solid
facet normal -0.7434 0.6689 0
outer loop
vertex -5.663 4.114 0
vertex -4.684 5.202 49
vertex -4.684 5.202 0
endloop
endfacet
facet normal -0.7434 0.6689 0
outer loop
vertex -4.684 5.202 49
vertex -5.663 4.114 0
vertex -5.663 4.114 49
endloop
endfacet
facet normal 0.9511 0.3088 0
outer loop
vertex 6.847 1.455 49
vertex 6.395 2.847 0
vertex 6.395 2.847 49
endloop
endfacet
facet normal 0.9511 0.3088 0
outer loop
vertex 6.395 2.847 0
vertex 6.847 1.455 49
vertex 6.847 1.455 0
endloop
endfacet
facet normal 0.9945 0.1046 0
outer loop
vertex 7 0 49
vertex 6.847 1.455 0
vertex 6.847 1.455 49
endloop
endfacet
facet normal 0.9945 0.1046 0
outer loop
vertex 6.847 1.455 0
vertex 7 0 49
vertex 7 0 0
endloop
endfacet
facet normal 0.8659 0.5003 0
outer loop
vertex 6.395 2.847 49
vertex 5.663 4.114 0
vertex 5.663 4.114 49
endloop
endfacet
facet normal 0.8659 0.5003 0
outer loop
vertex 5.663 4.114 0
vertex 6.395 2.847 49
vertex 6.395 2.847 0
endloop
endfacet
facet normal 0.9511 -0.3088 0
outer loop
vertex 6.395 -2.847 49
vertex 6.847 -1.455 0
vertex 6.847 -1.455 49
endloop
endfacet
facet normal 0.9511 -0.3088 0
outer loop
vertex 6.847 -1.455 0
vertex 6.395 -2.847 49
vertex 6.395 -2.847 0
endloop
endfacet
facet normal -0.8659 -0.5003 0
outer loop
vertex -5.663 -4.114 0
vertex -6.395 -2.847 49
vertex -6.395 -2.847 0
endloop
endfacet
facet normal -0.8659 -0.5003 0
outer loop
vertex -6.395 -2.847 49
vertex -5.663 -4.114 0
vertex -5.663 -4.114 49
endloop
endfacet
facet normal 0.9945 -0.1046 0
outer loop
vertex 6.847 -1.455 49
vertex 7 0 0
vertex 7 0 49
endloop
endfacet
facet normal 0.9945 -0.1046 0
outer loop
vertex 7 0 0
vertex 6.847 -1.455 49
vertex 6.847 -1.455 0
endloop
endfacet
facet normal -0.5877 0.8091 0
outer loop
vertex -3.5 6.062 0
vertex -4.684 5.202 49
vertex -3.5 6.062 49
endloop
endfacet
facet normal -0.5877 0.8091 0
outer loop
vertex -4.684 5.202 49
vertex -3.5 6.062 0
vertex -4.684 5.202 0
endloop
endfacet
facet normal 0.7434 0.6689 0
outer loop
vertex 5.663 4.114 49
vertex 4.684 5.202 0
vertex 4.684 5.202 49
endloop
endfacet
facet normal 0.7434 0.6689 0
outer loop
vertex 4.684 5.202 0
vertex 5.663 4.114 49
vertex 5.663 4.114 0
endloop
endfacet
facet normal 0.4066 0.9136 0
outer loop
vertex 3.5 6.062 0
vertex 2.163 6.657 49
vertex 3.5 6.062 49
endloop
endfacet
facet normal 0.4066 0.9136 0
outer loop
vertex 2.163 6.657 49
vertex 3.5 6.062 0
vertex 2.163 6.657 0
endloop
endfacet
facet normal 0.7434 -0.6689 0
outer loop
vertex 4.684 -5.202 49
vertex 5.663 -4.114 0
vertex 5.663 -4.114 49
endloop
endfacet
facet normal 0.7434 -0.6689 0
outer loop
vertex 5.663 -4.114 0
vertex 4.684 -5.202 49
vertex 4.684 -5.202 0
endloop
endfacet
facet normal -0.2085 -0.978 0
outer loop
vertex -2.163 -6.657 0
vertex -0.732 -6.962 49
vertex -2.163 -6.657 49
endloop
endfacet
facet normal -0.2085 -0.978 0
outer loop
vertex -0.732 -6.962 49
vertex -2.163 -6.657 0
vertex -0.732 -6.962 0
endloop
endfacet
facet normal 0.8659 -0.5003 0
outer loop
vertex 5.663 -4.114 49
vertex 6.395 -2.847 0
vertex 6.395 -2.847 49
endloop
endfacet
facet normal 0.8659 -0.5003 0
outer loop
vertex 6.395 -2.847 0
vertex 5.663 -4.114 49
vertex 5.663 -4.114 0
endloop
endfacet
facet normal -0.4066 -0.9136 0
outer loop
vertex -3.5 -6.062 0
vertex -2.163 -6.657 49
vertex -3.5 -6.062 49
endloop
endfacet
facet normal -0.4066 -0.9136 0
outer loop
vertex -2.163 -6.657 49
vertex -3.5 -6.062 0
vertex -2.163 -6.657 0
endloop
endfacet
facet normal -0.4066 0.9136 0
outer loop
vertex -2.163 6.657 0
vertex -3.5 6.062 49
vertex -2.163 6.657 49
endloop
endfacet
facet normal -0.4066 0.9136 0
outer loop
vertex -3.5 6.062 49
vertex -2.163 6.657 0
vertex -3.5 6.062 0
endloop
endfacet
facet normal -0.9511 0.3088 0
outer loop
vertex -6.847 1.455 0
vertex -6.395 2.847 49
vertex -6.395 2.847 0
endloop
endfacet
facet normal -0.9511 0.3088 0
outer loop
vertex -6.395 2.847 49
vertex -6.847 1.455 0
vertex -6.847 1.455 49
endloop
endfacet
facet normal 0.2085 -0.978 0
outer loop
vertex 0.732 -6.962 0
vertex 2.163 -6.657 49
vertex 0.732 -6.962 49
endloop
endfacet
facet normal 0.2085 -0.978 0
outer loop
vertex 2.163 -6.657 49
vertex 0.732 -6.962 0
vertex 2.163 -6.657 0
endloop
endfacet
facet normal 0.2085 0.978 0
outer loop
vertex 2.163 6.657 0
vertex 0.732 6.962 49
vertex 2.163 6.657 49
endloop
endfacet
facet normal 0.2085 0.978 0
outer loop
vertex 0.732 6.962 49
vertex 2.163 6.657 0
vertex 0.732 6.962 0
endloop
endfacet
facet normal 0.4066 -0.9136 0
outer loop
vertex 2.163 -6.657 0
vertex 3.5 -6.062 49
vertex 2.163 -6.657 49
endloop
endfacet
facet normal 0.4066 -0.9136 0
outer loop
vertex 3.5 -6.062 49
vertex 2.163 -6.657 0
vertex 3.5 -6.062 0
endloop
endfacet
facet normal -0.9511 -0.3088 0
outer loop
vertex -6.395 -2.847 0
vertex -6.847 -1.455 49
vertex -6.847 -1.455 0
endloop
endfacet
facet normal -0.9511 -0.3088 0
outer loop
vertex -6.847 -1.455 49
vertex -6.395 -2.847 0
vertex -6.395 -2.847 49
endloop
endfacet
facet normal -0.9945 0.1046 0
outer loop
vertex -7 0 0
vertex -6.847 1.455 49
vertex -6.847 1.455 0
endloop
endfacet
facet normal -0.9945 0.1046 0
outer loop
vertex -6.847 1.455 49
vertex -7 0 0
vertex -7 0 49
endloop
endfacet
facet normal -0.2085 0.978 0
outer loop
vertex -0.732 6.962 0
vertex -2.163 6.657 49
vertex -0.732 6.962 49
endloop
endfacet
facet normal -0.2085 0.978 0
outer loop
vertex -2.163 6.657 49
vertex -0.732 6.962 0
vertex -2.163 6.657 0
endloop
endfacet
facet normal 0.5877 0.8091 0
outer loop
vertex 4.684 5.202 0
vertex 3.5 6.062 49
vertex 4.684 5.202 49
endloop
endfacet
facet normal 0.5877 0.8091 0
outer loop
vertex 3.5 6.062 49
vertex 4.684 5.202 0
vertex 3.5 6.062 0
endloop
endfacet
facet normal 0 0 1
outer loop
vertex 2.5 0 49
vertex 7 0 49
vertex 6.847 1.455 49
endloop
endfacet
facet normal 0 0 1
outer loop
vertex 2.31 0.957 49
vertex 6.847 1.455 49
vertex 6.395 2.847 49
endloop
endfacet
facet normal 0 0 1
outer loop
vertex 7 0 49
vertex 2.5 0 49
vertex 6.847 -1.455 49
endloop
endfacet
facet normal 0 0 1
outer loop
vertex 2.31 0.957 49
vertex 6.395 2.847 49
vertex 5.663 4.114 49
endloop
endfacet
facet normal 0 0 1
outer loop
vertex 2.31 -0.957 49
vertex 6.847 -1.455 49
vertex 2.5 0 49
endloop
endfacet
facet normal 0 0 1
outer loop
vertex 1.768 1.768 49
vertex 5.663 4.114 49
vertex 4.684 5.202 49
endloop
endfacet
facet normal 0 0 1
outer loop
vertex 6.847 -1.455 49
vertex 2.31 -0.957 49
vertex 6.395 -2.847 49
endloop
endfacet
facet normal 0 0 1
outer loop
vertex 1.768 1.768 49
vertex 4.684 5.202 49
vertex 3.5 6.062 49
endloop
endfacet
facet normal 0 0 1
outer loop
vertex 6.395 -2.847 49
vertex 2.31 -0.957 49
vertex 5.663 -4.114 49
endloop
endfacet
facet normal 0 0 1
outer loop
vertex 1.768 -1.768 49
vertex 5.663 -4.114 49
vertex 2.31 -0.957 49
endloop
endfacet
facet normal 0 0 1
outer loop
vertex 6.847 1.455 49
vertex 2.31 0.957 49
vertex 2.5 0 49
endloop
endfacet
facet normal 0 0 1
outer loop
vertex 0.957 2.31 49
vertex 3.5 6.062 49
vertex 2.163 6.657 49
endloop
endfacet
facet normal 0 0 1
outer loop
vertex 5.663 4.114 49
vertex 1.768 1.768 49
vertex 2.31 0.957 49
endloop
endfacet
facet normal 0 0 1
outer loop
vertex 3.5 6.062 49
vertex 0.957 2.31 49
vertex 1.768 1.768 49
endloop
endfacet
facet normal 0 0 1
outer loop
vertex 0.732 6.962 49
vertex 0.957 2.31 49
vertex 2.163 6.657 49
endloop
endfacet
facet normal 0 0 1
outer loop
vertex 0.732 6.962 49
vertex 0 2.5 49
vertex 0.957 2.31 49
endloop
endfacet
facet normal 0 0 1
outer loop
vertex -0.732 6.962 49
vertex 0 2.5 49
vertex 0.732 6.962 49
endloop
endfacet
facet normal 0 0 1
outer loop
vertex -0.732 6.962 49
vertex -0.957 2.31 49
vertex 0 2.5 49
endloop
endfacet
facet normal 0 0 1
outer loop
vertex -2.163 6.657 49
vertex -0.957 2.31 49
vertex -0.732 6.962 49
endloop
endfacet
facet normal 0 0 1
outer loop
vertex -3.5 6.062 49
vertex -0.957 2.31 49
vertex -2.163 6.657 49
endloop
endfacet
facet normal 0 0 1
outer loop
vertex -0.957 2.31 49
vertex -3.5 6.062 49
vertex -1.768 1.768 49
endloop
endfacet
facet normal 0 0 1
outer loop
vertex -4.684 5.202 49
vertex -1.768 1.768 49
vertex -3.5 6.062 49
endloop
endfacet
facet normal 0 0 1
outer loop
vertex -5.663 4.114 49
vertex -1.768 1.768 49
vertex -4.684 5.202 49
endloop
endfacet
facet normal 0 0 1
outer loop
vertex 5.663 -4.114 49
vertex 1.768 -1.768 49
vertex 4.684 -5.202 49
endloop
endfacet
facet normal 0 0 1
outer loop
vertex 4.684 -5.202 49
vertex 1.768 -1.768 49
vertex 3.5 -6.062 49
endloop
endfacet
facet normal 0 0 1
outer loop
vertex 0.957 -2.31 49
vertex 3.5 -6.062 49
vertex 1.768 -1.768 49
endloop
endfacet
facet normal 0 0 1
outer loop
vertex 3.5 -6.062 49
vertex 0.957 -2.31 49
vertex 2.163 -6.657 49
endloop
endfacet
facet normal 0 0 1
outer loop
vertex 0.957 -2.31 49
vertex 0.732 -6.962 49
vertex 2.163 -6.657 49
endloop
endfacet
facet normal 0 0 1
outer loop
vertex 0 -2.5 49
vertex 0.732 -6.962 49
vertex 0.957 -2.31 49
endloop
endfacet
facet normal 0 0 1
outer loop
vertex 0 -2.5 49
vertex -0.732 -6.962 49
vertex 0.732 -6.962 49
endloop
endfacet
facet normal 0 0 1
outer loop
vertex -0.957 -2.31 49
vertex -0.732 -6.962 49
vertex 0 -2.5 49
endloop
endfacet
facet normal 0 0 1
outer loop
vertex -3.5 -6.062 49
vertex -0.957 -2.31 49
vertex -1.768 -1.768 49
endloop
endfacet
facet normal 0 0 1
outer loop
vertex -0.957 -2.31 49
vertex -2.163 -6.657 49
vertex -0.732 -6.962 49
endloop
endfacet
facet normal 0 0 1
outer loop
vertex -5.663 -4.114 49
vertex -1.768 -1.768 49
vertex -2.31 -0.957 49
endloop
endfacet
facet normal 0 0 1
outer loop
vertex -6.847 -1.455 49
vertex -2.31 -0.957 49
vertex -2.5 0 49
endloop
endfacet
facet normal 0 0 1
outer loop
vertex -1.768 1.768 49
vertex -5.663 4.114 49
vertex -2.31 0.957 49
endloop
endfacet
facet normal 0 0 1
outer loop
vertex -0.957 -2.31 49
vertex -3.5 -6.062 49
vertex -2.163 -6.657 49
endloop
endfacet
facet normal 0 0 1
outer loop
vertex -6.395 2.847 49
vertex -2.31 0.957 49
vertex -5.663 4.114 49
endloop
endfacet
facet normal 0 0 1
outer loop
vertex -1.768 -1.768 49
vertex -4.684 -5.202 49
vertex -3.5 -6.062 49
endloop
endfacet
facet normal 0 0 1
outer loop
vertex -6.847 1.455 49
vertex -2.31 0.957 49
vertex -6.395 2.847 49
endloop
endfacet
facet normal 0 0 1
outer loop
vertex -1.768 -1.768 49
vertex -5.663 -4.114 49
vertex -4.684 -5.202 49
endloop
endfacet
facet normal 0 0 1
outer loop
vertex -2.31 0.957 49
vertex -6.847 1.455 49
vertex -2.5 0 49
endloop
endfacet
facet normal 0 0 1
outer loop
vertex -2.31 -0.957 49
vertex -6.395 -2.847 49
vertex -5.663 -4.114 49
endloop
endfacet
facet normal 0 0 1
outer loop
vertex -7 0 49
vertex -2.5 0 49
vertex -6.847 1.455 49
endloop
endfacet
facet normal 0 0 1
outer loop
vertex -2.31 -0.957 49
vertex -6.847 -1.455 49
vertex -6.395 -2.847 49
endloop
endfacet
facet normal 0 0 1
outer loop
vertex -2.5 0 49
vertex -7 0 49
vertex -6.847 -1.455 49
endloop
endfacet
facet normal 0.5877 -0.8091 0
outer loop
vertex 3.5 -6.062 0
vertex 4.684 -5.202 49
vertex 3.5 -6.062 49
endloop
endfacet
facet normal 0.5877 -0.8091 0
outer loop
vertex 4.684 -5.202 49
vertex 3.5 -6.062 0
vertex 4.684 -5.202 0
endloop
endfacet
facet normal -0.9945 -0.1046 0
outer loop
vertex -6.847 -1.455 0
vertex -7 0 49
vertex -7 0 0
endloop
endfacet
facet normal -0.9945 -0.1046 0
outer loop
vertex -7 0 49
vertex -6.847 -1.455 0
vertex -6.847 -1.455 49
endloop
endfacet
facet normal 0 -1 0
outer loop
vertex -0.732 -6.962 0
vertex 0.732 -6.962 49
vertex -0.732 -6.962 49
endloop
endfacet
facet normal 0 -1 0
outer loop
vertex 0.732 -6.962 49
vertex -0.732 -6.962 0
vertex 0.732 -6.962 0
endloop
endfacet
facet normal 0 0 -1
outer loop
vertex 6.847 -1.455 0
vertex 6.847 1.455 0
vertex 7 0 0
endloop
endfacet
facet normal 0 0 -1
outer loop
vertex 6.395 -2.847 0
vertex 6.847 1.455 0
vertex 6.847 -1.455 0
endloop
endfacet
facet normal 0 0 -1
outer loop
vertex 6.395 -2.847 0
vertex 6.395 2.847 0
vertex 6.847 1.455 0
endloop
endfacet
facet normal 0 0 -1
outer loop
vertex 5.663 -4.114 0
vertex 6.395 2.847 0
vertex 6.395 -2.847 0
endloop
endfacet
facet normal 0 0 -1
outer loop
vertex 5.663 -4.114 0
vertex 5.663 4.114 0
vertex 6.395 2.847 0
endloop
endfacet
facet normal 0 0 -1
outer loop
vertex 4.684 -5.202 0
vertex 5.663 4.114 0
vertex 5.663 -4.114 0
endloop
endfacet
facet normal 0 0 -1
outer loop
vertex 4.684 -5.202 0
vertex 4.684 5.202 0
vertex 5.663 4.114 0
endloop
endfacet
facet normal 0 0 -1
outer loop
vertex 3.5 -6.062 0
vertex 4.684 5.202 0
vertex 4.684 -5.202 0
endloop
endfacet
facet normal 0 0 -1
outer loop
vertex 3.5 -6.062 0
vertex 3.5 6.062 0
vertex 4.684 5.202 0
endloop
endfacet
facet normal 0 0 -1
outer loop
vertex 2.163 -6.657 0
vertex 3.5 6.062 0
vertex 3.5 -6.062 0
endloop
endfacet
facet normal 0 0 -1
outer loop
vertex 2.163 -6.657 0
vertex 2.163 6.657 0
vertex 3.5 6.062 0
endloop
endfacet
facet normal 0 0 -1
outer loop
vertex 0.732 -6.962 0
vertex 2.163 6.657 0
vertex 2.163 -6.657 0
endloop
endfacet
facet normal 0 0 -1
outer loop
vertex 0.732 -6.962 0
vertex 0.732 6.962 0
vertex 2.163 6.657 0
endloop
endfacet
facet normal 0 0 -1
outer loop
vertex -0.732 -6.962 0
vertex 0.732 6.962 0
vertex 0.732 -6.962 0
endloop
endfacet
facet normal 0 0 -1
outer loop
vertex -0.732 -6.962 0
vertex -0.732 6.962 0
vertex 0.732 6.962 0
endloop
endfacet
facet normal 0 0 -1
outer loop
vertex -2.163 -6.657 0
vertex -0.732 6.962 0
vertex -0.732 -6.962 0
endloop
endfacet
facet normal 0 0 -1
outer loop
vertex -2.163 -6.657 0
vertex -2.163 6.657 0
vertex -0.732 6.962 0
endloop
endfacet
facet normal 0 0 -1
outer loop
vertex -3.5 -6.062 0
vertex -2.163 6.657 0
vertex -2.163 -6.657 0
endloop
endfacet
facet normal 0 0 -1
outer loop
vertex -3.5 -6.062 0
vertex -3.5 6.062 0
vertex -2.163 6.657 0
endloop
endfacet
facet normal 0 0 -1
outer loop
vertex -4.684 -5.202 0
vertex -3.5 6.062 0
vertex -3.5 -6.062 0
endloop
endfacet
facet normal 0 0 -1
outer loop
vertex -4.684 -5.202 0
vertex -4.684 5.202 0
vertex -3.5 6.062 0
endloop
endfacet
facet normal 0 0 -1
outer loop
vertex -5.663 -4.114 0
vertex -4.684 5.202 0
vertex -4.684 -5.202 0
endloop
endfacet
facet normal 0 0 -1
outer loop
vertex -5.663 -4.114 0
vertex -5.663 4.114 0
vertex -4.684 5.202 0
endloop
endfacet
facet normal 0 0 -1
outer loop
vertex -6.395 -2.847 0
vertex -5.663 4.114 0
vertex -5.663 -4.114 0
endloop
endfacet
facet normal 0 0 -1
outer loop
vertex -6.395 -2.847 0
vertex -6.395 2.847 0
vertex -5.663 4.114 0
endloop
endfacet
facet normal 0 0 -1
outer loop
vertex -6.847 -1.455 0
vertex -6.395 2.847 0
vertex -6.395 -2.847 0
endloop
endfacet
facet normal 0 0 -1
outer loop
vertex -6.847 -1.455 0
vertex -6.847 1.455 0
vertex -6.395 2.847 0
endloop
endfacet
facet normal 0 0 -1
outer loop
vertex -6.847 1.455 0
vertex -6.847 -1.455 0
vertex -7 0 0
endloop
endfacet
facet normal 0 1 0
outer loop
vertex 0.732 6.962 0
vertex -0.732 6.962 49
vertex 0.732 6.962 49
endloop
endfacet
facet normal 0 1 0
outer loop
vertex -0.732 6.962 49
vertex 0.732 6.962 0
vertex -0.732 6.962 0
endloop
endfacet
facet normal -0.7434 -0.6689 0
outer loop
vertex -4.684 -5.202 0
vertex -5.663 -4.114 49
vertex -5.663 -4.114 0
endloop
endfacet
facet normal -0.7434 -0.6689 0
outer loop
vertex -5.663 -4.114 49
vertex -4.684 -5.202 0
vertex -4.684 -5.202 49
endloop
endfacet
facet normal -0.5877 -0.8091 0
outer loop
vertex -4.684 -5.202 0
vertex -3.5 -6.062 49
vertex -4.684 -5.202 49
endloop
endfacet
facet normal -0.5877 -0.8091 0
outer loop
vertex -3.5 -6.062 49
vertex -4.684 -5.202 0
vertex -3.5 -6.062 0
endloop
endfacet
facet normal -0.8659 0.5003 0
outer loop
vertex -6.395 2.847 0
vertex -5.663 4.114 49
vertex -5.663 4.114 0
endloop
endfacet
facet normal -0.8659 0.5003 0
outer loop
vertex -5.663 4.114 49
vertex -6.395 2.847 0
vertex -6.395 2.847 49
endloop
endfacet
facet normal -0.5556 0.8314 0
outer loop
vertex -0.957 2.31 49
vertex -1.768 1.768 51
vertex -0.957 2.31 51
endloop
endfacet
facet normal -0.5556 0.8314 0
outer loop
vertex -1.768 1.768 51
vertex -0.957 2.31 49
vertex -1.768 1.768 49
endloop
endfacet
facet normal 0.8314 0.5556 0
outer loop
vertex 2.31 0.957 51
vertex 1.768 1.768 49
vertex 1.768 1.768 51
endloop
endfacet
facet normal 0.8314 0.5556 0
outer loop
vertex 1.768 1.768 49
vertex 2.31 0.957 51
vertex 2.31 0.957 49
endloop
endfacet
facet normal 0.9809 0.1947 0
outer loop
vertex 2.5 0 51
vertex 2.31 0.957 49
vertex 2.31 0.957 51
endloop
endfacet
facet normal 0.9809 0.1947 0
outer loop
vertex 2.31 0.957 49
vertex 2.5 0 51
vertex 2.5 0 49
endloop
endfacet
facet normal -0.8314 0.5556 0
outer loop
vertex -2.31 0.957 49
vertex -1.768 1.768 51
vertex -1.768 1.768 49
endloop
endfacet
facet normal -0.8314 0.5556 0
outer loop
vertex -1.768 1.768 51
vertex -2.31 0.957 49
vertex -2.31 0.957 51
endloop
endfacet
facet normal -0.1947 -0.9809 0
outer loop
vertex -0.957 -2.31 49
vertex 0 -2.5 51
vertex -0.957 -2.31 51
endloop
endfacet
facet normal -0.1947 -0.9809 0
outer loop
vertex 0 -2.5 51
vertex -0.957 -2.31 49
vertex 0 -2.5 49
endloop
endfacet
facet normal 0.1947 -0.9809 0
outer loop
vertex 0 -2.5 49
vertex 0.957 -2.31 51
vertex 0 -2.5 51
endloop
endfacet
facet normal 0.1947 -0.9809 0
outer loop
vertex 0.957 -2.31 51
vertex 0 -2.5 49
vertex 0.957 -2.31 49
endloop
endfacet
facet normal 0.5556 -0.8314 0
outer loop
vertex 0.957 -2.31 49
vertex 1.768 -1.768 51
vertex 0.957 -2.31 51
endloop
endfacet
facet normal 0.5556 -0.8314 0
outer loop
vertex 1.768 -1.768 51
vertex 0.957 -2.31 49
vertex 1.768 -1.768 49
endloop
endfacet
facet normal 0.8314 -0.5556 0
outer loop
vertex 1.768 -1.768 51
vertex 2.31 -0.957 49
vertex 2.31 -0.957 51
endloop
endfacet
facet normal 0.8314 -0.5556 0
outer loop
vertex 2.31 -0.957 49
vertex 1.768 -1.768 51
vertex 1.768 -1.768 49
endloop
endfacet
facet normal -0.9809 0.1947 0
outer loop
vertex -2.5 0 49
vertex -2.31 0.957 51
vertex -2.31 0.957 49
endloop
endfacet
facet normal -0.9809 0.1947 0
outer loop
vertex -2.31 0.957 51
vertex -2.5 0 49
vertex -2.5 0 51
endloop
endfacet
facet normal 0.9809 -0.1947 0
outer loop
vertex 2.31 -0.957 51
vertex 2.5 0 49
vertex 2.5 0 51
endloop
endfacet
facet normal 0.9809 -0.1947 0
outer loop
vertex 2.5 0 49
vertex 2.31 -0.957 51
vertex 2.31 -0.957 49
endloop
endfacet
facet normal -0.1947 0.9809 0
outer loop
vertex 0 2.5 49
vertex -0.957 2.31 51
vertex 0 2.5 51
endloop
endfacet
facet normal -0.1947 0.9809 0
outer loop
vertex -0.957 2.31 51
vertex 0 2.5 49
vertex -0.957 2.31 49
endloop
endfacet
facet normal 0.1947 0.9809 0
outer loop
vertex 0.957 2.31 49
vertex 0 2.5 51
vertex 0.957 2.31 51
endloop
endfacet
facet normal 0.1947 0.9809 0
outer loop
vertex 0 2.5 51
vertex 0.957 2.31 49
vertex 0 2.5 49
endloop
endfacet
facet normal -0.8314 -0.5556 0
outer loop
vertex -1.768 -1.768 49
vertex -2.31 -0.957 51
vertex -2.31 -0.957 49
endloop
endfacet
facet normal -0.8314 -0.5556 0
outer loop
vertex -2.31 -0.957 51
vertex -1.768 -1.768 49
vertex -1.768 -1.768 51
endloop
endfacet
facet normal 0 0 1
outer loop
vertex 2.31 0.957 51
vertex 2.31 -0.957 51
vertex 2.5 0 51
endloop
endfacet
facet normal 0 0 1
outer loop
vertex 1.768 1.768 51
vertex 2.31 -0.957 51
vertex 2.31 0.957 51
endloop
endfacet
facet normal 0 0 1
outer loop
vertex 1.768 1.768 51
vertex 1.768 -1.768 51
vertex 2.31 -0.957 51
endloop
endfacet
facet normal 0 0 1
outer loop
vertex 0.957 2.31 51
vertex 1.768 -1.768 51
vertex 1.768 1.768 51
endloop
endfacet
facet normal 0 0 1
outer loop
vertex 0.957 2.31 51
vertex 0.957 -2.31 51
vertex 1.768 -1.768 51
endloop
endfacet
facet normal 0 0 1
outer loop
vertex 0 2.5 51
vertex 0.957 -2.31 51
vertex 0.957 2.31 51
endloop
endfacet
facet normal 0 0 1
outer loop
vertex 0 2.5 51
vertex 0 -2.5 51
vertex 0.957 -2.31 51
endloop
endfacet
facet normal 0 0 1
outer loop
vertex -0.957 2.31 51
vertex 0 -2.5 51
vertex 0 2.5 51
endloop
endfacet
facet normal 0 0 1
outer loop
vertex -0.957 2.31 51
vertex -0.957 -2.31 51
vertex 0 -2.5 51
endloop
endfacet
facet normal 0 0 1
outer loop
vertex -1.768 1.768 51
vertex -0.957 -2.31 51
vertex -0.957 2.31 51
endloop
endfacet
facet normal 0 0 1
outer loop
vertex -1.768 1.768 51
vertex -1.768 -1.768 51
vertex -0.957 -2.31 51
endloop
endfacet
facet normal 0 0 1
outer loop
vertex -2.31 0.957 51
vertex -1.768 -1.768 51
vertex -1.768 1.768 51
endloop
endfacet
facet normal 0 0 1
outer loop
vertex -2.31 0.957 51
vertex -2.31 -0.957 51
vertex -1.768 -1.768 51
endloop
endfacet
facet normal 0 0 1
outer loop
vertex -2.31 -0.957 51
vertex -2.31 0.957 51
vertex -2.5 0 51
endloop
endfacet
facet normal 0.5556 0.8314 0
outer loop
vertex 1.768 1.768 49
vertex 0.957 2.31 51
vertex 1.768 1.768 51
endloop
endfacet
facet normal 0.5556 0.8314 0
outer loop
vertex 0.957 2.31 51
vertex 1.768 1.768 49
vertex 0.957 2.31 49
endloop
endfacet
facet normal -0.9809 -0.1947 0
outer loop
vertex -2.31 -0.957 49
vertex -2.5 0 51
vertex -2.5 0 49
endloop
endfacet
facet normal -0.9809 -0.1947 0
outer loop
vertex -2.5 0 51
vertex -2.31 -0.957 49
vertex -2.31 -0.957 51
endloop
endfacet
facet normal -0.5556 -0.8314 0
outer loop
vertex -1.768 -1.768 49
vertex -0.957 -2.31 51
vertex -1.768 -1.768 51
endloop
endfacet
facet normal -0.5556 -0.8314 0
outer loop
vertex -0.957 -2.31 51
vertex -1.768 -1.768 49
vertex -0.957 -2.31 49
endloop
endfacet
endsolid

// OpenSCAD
module aaBattery(length, diameter) 
{
	length = 49; 
	diameter = 14;
	nippleHeight = 2;
	nippleDiameter = 5;

    union()
	{
		cylinder(h=length, r=diameter/2, $fs=1);
		translate ([0,0,length]) cylinder(h=nippleHeight, r=nippleDiameter/2, $fs=1);
	}
}

aaBattery();
//translate([0, 0, 51]) aaBattery();

caseLength = 120;
caseHeight = 35;
cube();
